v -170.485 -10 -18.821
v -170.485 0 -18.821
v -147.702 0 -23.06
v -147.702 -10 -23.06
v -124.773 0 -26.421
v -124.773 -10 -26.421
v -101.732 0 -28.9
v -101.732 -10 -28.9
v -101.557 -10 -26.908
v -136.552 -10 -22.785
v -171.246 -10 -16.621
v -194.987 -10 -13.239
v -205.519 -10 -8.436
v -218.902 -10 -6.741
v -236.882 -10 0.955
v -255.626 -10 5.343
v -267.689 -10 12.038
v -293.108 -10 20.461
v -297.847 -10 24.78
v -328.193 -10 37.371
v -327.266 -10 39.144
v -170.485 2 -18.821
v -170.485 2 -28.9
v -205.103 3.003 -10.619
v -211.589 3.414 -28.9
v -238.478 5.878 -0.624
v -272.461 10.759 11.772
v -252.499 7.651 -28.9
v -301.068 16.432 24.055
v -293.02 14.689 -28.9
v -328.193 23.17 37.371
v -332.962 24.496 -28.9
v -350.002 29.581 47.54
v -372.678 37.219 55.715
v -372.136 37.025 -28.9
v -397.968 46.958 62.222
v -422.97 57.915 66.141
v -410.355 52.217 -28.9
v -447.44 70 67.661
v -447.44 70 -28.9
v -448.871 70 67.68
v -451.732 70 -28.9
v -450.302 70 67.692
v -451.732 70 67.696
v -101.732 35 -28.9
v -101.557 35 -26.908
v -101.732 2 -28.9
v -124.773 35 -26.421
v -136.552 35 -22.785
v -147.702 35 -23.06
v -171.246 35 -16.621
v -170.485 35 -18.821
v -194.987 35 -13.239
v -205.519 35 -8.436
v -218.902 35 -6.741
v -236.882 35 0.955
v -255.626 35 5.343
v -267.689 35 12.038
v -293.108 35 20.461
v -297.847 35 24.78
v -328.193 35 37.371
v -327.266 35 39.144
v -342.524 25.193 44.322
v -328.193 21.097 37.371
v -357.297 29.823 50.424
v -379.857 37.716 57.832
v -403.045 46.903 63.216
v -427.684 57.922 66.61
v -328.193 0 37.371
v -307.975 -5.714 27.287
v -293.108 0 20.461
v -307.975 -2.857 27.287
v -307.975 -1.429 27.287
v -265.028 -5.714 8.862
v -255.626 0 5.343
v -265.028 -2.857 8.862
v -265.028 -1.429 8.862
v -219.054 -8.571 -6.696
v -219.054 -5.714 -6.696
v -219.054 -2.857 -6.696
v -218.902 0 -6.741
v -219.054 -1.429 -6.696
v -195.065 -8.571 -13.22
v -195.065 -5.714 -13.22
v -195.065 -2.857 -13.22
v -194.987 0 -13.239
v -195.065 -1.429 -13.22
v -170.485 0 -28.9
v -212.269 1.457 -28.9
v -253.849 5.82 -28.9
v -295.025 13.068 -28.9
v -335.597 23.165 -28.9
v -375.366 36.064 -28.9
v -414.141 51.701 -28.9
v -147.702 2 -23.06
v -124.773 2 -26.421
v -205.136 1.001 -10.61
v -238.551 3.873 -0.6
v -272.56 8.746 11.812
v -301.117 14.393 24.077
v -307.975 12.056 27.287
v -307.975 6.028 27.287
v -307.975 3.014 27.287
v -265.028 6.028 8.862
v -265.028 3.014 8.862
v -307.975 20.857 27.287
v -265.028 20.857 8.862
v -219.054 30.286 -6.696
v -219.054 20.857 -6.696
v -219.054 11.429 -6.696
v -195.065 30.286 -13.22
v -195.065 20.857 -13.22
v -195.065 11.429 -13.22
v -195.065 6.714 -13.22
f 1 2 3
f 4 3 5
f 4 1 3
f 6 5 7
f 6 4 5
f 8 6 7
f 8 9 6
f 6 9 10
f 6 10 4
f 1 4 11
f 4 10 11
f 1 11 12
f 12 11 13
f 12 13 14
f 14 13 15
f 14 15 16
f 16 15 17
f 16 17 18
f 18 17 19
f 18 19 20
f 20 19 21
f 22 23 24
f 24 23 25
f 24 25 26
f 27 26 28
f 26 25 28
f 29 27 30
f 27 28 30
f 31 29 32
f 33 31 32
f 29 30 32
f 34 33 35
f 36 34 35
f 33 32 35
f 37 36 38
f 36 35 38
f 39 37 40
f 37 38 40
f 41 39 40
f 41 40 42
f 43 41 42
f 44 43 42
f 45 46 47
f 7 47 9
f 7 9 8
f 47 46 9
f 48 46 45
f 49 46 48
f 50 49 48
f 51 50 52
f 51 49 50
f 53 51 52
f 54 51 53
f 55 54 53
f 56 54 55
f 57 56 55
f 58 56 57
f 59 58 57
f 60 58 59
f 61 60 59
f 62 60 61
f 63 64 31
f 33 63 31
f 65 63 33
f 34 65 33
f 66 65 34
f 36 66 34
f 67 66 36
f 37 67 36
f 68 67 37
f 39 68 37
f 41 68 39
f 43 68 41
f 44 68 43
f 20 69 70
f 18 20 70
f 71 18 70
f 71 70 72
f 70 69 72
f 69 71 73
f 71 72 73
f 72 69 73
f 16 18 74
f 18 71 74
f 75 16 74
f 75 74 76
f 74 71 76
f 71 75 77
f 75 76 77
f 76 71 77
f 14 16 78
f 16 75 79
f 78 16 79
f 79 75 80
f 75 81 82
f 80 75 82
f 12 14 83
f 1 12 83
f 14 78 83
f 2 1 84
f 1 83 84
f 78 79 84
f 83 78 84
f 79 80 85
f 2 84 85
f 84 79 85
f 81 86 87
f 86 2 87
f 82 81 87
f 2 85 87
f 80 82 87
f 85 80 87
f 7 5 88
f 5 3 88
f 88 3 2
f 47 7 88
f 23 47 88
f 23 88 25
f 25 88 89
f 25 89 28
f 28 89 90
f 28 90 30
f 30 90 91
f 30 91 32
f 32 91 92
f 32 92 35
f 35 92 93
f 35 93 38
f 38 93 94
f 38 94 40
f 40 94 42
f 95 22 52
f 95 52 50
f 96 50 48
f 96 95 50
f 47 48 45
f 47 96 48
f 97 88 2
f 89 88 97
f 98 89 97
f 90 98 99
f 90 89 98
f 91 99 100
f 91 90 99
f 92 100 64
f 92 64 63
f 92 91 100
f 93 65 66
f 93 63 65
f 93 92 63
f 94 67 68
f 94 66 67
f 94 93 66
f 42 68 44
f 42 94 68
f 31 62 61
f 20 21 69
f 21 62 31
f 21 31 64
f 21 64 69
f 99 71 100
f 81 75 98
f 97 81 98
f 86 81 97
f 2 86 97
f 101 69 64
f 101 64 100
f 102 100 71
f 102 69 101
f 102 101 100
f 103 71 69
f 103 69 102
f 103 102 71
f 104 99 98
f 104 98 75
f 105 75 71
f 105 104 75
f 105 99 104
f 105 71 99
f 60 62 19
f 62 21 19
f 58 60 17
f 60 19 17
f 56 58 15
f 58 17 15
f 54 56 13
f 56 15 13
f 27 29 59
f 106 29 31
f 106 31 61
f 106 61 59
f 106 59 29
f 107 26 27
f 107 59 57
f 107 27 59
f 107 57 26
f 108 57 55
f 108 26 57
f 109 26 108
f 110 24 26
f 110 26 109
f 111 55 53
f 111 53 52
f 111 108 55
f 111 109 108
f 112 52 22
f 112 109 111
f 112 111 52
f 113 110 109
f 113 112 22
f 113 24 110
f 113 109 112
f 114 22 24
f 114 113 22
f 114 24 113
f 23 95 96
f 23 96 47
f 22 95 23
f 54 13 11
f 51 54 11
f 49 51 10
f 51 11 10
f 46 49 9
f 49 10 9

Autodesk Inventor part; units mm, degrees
ref_plane "YZ Plane" through (0, 0, 0) normal (1, 0, 0) x (0, 1, 0)
ref_plane "XZ Plane" through (0, 0, 0) normal (0, 1, 0) x (-1, 0, 0)
ref_plane "XY Plane" through (0, 0, 0) normal (0, 0, 1) x (1, 0, 0)
sketch "スケッチ1" plane through (0, 0, 0) normal (0, 1, 0) x (-1, 0, 0)
  line L0 (101.7324, -28.9004) -> (451.7324, -28.9004)
  line L1 (451.7324, -28.9004) -> (451.7324, 67.6956)
  arc A0 (451.7324, 67.6956) -> (328.1926, 37.3714) centre (451.7324, -199.1148) ccw
  arc A1 (101.7324, -28.9004) -> (328.1926, 37.3714) centre (48.6916, 572.4068) ccw
  dimension "d1" = 350
  dimension "d2" = 603.642
extrude "押し出し1" add sketch "スケッチ1" along normal blind 70
sketch "スケッチ2" plane through (-101.7324, 0, -28.9004) normal (0, 0, -1) x (-1, 0, 0)
  arc A0 (68.7528, 0) -> (350, 70) centre (68.7528, 600) ccw
  line L0 (350, 0) -> (0, 0) projected
  line L1 (350, 0) -> (350, 70) projected
  line L2 (0, 0) -> (0, 70) projected
  point P0 (-101.7324, 0)
  dimension "d9" = 600
extrude "押し出し2" cut sketch "スケッチ2" against normal through all
shell "シェル1" thickness 2 removed faces 4 at (-334.0598, 39.1147, 40.3449) at (-150.6861, 46.6667, -22.5561) at (-359.2071, 70, 10.3289) at (-325.356, 65.1801, -28.9004)
sketch "スケッチ5" plane through (0, 0, 0) normal (0, 1, 0) x (-1, 0, 0)
  arc A0 (101.7324, -28.9004) -> (170.4851, -18.8207) centre (48.6916, 572.4068) ccw projected
  spline S0 degree 7 poles (328.1926, 37.3714) (308.4164, 27.0404) (287.5942, 17.2484) (265.7943, 8.15) (243.0935, -0.1185) (219.5774, -7.4369) (195.3405, -13.7005) (170.4851, -18.8207) knots 0 0 0 0 0 0 0 0 1 1 1 1 1 1 1 1 projected
  arc A1 (101.7324, -28.9004) -> (170.4851, -18.8207) centre (48.6916, 572.4068) ccw
  arc A2 (170.4851, -18.8207) -> (328.1926, 37.3714) centre (48.6916, 572.4068) ccw
  arc A3 (101.5566, -26.9081) -> (205.5189, -8.436) centre (48.6916, 572.4068) ccw
  arc A4 (205.5189, -8.436) -> (327.2665, 39.1441) centre (48.6916, 572.4068) ccw
  arc A5 (101.7324, -28.9004) -> (170.4851, -18.8207) centre (48.6916, 572.4068) ccw projected
  line L0 (101.5566, -26.9081) -> (101.7324, -28.9004)
  line L1 (327.2665, 39.1441) -> (328.1926, 37.3714)
  point P0 (0, 0)
  dimension "d11" = 2
extrude "押し出し3" add sketch "スケッチ5" along normal blind 35 and the other way blind 10
properties part number "splitter"
